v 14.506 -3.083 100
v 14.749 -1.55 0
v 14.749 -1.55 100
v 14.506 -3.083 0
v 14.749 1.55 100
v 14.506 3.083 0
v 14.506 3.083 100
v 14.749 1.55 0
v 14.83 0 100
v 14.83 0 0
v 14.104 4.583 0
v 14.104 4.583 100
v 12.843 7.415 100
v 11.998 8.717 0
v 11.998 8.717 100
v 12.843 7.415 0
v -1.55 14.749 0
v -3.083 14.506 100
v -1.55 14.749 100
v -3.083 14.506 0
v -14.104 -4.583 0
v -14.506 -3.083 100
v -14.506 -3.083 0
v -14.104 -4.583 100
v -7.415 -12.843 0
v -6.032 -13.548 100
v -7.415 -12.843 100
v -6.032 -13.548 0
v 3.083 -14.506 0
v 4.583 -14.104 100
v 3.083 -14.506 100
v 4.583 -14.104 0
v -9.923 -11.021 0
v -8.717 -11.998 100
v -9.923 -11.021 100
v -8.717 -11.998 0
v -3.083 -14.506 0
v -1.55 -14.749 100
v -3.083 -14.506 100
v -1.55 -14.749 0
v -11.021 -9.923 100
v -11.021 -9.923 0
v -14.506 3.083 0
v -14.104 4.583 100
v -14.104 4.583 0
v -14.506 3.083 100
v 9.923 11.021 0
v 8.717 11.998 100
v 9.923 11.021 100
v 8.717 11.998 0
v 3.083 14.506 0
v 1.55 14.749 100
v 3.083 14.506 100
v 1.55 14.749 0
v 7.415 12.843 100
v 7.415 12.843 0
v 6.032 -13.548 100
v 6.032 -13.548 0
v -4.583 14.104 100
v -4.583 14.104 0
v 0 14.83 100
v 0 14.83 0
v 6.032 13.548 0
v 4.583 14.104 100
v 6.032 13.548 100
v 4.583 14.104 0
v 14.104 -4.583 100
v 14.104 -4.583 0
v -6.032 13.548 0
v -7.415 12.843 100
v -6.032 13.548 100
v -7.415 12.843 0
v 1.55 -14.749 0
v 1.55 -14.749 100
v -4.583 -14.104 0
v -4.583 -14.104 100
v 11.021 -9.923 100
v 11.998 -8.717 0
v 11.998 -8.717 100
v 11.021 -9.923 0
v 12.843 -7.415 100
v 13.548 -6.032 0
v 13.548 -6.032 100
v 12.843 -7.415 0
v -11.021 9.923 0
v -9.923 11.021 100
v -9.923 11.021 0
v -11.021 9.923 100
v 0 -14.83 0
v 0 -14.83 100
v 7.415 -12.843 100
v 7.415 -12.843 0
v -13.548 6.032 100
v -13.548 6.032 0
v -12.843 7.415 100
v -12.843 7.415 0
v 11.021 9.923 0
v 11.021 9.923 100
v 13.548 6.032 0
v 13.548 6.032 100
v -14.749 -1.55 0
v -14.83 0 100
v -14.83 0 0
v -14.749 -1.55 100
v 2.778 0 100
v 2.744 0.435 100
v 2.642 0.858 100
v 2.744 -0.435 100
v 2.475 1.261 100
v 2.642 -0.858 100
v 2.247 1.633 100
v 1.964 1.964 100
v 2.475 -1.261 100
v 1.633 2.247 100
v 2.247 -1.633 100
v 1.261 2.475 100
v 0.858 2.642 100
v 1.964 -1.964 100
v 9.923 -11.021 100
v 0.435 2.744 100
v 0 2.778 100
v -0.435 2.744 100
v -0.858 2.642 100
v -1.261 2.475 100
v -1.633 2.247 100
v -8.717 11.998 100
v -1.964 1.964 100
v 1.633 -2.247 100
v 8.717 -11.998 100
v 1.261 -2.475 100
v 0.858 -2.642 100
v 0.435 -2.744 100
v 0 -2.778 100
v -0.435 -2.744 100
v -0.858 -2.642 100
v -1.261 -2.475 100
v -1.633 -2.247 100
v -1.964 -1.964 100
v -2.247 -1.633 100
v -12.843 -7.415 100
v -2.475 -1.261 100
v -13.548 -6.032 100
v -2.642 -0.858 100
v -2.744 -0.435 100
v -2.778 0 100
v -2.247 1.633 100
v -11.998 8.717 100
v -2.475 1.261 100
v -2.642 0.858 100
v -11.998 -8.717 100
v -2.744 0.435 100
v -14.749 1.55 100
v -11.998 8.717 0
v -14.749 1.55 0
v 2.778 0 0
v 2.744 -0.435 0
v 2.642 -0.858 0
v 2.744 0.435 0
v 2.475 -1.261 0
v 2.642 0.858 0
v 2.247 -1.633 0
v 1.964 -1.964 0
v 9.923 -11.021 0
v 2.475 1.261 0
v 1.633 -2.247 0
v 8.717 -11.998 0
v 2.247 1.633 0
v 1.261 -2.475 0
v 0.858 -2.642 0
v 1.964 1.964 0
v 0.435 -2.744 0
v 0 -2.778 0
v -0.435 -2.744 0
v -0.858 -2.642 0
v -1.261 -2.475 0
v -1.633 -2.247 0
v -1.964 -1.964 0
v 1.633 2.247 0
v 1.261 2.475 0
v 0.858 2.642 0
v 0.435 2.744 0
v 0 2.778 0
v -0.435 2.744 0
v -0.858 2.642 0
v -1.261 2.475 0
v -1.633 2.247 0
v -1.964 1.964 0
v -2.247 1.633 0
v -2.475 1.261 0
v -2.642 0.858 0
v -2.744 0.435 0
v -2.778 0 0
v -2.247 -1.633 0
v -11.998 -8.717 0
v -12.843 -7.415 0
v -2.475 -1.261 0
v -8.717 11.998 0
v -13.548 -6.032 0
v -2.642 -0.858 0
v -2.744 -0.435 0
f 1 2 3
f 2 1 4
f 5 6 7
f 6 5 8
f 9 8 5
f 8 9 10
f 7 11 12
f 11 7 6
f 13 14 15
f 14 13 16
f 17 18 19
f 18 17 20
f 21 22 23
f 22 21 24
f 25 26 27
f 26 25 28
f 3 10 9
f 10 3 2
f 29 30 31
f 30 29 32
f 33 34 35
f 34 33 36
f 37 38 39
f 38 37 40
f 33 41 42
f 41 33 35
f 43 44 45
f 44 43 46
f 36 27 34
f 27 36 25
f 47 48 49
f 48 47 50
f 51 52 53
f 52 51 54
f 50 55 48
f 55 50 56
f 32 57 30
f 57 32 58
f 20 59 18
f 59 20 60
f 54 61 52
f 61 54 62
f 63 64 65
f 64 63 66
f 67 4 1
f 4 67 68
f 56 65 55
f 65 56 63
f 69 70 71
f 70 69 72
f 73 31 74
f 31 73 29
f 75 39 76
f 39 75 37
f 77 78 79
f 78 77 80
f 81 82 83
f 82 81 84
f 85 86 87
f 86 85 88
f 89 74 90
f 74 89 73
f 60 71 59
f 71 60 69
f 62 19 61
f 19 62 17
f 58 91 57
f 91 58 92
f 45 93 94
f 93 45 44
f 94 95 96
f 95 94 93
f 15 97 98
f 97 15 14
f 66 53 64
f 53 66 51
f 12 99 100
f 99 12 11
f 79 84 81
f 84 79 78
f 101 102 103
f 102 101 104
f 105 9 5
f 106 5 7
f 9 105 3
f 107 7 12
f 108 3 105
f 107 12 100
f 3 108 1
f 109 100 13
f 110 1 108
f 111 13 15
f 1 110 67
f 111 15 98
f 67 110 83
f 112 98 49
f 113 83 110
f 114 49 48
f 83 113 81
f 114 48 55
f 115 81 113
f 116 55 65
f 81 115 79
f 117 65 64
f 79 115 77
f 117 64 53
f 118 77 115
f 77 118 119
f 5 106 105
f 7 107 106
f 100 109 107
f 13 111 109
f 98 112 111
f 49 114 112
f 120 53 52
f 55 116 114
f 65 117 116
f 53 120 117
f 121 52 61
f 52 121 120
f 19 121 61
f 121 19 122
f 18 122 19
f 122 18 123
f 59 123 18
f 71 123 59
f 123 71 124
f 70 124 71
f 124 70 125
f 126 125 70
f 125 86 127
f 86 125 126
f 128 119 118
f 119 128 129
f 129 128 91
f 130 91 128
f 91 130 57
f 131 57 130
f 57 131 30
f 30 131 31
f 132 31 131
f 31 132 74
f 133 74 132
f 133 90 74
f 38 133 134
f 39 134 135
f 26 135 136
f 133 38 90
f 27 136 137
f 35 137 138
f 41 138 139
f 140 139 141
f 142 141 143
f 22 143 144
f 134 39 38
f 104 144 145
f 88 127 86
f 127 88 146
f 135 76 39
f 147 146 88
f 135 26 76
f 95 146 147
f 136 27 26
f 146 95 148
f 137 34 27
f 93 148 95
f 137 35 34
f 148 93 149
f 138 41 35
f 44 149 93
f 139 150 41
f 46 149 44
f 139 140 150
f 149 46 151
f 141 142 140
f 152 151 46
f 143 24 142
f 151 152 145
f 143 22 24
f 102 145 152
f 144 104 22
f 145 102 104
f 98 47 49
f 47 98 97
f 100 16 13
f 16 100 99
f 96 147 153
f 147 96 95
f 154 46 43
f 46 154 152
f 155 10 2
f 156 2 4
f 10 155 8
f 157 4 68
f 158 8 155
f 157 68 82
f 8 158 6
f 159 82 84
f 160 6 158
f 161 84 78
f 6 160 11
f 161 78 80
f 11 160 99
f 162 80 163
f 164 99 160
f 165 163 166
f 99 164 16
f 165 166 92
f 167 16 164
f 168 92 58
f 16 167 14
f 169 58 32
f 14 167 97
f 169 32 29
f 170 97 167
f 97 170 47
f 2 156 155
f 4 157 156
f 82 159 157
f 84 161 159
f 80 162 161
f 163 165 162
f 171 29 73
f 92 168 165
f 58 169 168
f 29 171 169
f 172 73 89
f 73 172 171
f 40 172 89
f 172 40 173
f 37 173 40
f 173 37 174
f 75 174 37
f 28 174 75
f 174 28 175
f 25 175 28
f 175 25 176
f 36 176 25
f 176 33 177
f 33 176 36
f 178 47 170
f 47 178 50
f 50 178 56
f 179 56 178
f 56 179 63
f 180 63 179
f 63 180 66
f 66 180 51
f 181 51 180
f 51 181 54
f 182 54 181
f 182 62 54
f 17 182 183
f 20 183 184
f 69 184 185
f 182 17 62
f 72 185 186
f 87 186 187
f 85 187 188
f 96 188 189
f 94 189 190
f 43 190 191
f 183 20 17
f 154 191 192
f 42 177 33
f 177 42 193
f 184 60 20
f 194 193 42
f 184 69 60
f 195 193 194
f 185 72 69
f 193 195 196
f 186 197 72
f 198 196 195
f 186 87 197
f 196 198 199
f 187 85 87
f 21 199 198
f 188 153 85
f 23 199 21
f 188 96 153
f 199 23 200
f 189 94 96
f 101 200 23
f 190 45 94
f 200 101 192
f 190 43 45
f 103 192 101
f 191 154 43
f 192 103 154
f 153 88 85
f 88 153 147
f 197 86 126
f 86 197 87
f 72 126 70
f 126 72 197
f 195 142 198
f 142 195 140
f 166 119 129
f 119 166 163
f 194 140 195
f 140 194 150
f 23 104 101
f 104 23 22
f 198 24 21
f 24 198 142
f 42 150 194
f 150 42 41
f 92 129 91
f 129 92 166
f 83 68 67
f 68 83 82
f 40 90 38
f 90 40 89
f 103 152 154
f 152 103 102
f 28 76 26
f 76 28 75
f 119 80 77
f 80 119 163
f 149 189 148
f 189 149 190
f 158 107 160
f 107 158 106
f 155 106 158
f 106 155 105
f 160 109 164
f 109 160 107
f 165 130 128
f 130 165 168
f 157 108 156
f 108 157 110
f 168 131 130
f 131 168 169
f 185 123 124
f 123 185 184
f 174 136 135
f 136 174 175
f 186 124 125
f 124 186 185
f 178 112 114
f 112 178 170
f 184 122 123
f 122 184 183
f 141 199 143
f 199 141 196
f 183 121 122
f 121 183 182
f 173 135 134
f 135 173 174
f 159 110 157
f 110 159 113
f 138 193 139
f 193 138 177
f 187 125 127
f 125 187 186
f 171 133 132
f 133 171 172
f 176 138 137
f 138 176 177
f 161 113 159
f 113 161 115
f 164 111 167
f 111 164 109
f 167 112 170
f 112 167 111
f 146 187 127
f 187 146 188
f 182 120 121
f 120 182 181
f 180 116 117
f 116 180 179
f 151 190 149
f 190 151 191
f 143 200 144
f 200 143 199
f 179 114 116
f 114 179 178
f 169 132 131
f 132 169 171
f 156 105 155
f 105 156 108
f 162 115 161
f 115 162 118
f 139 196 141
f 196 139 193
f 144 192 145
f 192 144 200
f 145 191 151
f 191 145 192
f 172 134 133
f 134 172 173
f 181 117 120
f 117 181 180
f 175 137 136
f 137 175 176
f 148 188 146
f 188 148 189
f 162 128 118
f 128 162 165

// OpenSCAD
        wall_thickness = 1.69;
        bore_clearance = 0.778;
        roller_radius = 14.83;
        
        module roller() {
            difference() {
                cylinder(h=100, r=roller_radius, $fn=60);
                translate([0,0,-5])
                    cylinder(h=110, r=bore_clearance + 2, $fn=40);
            }
        }
        roller();
        
